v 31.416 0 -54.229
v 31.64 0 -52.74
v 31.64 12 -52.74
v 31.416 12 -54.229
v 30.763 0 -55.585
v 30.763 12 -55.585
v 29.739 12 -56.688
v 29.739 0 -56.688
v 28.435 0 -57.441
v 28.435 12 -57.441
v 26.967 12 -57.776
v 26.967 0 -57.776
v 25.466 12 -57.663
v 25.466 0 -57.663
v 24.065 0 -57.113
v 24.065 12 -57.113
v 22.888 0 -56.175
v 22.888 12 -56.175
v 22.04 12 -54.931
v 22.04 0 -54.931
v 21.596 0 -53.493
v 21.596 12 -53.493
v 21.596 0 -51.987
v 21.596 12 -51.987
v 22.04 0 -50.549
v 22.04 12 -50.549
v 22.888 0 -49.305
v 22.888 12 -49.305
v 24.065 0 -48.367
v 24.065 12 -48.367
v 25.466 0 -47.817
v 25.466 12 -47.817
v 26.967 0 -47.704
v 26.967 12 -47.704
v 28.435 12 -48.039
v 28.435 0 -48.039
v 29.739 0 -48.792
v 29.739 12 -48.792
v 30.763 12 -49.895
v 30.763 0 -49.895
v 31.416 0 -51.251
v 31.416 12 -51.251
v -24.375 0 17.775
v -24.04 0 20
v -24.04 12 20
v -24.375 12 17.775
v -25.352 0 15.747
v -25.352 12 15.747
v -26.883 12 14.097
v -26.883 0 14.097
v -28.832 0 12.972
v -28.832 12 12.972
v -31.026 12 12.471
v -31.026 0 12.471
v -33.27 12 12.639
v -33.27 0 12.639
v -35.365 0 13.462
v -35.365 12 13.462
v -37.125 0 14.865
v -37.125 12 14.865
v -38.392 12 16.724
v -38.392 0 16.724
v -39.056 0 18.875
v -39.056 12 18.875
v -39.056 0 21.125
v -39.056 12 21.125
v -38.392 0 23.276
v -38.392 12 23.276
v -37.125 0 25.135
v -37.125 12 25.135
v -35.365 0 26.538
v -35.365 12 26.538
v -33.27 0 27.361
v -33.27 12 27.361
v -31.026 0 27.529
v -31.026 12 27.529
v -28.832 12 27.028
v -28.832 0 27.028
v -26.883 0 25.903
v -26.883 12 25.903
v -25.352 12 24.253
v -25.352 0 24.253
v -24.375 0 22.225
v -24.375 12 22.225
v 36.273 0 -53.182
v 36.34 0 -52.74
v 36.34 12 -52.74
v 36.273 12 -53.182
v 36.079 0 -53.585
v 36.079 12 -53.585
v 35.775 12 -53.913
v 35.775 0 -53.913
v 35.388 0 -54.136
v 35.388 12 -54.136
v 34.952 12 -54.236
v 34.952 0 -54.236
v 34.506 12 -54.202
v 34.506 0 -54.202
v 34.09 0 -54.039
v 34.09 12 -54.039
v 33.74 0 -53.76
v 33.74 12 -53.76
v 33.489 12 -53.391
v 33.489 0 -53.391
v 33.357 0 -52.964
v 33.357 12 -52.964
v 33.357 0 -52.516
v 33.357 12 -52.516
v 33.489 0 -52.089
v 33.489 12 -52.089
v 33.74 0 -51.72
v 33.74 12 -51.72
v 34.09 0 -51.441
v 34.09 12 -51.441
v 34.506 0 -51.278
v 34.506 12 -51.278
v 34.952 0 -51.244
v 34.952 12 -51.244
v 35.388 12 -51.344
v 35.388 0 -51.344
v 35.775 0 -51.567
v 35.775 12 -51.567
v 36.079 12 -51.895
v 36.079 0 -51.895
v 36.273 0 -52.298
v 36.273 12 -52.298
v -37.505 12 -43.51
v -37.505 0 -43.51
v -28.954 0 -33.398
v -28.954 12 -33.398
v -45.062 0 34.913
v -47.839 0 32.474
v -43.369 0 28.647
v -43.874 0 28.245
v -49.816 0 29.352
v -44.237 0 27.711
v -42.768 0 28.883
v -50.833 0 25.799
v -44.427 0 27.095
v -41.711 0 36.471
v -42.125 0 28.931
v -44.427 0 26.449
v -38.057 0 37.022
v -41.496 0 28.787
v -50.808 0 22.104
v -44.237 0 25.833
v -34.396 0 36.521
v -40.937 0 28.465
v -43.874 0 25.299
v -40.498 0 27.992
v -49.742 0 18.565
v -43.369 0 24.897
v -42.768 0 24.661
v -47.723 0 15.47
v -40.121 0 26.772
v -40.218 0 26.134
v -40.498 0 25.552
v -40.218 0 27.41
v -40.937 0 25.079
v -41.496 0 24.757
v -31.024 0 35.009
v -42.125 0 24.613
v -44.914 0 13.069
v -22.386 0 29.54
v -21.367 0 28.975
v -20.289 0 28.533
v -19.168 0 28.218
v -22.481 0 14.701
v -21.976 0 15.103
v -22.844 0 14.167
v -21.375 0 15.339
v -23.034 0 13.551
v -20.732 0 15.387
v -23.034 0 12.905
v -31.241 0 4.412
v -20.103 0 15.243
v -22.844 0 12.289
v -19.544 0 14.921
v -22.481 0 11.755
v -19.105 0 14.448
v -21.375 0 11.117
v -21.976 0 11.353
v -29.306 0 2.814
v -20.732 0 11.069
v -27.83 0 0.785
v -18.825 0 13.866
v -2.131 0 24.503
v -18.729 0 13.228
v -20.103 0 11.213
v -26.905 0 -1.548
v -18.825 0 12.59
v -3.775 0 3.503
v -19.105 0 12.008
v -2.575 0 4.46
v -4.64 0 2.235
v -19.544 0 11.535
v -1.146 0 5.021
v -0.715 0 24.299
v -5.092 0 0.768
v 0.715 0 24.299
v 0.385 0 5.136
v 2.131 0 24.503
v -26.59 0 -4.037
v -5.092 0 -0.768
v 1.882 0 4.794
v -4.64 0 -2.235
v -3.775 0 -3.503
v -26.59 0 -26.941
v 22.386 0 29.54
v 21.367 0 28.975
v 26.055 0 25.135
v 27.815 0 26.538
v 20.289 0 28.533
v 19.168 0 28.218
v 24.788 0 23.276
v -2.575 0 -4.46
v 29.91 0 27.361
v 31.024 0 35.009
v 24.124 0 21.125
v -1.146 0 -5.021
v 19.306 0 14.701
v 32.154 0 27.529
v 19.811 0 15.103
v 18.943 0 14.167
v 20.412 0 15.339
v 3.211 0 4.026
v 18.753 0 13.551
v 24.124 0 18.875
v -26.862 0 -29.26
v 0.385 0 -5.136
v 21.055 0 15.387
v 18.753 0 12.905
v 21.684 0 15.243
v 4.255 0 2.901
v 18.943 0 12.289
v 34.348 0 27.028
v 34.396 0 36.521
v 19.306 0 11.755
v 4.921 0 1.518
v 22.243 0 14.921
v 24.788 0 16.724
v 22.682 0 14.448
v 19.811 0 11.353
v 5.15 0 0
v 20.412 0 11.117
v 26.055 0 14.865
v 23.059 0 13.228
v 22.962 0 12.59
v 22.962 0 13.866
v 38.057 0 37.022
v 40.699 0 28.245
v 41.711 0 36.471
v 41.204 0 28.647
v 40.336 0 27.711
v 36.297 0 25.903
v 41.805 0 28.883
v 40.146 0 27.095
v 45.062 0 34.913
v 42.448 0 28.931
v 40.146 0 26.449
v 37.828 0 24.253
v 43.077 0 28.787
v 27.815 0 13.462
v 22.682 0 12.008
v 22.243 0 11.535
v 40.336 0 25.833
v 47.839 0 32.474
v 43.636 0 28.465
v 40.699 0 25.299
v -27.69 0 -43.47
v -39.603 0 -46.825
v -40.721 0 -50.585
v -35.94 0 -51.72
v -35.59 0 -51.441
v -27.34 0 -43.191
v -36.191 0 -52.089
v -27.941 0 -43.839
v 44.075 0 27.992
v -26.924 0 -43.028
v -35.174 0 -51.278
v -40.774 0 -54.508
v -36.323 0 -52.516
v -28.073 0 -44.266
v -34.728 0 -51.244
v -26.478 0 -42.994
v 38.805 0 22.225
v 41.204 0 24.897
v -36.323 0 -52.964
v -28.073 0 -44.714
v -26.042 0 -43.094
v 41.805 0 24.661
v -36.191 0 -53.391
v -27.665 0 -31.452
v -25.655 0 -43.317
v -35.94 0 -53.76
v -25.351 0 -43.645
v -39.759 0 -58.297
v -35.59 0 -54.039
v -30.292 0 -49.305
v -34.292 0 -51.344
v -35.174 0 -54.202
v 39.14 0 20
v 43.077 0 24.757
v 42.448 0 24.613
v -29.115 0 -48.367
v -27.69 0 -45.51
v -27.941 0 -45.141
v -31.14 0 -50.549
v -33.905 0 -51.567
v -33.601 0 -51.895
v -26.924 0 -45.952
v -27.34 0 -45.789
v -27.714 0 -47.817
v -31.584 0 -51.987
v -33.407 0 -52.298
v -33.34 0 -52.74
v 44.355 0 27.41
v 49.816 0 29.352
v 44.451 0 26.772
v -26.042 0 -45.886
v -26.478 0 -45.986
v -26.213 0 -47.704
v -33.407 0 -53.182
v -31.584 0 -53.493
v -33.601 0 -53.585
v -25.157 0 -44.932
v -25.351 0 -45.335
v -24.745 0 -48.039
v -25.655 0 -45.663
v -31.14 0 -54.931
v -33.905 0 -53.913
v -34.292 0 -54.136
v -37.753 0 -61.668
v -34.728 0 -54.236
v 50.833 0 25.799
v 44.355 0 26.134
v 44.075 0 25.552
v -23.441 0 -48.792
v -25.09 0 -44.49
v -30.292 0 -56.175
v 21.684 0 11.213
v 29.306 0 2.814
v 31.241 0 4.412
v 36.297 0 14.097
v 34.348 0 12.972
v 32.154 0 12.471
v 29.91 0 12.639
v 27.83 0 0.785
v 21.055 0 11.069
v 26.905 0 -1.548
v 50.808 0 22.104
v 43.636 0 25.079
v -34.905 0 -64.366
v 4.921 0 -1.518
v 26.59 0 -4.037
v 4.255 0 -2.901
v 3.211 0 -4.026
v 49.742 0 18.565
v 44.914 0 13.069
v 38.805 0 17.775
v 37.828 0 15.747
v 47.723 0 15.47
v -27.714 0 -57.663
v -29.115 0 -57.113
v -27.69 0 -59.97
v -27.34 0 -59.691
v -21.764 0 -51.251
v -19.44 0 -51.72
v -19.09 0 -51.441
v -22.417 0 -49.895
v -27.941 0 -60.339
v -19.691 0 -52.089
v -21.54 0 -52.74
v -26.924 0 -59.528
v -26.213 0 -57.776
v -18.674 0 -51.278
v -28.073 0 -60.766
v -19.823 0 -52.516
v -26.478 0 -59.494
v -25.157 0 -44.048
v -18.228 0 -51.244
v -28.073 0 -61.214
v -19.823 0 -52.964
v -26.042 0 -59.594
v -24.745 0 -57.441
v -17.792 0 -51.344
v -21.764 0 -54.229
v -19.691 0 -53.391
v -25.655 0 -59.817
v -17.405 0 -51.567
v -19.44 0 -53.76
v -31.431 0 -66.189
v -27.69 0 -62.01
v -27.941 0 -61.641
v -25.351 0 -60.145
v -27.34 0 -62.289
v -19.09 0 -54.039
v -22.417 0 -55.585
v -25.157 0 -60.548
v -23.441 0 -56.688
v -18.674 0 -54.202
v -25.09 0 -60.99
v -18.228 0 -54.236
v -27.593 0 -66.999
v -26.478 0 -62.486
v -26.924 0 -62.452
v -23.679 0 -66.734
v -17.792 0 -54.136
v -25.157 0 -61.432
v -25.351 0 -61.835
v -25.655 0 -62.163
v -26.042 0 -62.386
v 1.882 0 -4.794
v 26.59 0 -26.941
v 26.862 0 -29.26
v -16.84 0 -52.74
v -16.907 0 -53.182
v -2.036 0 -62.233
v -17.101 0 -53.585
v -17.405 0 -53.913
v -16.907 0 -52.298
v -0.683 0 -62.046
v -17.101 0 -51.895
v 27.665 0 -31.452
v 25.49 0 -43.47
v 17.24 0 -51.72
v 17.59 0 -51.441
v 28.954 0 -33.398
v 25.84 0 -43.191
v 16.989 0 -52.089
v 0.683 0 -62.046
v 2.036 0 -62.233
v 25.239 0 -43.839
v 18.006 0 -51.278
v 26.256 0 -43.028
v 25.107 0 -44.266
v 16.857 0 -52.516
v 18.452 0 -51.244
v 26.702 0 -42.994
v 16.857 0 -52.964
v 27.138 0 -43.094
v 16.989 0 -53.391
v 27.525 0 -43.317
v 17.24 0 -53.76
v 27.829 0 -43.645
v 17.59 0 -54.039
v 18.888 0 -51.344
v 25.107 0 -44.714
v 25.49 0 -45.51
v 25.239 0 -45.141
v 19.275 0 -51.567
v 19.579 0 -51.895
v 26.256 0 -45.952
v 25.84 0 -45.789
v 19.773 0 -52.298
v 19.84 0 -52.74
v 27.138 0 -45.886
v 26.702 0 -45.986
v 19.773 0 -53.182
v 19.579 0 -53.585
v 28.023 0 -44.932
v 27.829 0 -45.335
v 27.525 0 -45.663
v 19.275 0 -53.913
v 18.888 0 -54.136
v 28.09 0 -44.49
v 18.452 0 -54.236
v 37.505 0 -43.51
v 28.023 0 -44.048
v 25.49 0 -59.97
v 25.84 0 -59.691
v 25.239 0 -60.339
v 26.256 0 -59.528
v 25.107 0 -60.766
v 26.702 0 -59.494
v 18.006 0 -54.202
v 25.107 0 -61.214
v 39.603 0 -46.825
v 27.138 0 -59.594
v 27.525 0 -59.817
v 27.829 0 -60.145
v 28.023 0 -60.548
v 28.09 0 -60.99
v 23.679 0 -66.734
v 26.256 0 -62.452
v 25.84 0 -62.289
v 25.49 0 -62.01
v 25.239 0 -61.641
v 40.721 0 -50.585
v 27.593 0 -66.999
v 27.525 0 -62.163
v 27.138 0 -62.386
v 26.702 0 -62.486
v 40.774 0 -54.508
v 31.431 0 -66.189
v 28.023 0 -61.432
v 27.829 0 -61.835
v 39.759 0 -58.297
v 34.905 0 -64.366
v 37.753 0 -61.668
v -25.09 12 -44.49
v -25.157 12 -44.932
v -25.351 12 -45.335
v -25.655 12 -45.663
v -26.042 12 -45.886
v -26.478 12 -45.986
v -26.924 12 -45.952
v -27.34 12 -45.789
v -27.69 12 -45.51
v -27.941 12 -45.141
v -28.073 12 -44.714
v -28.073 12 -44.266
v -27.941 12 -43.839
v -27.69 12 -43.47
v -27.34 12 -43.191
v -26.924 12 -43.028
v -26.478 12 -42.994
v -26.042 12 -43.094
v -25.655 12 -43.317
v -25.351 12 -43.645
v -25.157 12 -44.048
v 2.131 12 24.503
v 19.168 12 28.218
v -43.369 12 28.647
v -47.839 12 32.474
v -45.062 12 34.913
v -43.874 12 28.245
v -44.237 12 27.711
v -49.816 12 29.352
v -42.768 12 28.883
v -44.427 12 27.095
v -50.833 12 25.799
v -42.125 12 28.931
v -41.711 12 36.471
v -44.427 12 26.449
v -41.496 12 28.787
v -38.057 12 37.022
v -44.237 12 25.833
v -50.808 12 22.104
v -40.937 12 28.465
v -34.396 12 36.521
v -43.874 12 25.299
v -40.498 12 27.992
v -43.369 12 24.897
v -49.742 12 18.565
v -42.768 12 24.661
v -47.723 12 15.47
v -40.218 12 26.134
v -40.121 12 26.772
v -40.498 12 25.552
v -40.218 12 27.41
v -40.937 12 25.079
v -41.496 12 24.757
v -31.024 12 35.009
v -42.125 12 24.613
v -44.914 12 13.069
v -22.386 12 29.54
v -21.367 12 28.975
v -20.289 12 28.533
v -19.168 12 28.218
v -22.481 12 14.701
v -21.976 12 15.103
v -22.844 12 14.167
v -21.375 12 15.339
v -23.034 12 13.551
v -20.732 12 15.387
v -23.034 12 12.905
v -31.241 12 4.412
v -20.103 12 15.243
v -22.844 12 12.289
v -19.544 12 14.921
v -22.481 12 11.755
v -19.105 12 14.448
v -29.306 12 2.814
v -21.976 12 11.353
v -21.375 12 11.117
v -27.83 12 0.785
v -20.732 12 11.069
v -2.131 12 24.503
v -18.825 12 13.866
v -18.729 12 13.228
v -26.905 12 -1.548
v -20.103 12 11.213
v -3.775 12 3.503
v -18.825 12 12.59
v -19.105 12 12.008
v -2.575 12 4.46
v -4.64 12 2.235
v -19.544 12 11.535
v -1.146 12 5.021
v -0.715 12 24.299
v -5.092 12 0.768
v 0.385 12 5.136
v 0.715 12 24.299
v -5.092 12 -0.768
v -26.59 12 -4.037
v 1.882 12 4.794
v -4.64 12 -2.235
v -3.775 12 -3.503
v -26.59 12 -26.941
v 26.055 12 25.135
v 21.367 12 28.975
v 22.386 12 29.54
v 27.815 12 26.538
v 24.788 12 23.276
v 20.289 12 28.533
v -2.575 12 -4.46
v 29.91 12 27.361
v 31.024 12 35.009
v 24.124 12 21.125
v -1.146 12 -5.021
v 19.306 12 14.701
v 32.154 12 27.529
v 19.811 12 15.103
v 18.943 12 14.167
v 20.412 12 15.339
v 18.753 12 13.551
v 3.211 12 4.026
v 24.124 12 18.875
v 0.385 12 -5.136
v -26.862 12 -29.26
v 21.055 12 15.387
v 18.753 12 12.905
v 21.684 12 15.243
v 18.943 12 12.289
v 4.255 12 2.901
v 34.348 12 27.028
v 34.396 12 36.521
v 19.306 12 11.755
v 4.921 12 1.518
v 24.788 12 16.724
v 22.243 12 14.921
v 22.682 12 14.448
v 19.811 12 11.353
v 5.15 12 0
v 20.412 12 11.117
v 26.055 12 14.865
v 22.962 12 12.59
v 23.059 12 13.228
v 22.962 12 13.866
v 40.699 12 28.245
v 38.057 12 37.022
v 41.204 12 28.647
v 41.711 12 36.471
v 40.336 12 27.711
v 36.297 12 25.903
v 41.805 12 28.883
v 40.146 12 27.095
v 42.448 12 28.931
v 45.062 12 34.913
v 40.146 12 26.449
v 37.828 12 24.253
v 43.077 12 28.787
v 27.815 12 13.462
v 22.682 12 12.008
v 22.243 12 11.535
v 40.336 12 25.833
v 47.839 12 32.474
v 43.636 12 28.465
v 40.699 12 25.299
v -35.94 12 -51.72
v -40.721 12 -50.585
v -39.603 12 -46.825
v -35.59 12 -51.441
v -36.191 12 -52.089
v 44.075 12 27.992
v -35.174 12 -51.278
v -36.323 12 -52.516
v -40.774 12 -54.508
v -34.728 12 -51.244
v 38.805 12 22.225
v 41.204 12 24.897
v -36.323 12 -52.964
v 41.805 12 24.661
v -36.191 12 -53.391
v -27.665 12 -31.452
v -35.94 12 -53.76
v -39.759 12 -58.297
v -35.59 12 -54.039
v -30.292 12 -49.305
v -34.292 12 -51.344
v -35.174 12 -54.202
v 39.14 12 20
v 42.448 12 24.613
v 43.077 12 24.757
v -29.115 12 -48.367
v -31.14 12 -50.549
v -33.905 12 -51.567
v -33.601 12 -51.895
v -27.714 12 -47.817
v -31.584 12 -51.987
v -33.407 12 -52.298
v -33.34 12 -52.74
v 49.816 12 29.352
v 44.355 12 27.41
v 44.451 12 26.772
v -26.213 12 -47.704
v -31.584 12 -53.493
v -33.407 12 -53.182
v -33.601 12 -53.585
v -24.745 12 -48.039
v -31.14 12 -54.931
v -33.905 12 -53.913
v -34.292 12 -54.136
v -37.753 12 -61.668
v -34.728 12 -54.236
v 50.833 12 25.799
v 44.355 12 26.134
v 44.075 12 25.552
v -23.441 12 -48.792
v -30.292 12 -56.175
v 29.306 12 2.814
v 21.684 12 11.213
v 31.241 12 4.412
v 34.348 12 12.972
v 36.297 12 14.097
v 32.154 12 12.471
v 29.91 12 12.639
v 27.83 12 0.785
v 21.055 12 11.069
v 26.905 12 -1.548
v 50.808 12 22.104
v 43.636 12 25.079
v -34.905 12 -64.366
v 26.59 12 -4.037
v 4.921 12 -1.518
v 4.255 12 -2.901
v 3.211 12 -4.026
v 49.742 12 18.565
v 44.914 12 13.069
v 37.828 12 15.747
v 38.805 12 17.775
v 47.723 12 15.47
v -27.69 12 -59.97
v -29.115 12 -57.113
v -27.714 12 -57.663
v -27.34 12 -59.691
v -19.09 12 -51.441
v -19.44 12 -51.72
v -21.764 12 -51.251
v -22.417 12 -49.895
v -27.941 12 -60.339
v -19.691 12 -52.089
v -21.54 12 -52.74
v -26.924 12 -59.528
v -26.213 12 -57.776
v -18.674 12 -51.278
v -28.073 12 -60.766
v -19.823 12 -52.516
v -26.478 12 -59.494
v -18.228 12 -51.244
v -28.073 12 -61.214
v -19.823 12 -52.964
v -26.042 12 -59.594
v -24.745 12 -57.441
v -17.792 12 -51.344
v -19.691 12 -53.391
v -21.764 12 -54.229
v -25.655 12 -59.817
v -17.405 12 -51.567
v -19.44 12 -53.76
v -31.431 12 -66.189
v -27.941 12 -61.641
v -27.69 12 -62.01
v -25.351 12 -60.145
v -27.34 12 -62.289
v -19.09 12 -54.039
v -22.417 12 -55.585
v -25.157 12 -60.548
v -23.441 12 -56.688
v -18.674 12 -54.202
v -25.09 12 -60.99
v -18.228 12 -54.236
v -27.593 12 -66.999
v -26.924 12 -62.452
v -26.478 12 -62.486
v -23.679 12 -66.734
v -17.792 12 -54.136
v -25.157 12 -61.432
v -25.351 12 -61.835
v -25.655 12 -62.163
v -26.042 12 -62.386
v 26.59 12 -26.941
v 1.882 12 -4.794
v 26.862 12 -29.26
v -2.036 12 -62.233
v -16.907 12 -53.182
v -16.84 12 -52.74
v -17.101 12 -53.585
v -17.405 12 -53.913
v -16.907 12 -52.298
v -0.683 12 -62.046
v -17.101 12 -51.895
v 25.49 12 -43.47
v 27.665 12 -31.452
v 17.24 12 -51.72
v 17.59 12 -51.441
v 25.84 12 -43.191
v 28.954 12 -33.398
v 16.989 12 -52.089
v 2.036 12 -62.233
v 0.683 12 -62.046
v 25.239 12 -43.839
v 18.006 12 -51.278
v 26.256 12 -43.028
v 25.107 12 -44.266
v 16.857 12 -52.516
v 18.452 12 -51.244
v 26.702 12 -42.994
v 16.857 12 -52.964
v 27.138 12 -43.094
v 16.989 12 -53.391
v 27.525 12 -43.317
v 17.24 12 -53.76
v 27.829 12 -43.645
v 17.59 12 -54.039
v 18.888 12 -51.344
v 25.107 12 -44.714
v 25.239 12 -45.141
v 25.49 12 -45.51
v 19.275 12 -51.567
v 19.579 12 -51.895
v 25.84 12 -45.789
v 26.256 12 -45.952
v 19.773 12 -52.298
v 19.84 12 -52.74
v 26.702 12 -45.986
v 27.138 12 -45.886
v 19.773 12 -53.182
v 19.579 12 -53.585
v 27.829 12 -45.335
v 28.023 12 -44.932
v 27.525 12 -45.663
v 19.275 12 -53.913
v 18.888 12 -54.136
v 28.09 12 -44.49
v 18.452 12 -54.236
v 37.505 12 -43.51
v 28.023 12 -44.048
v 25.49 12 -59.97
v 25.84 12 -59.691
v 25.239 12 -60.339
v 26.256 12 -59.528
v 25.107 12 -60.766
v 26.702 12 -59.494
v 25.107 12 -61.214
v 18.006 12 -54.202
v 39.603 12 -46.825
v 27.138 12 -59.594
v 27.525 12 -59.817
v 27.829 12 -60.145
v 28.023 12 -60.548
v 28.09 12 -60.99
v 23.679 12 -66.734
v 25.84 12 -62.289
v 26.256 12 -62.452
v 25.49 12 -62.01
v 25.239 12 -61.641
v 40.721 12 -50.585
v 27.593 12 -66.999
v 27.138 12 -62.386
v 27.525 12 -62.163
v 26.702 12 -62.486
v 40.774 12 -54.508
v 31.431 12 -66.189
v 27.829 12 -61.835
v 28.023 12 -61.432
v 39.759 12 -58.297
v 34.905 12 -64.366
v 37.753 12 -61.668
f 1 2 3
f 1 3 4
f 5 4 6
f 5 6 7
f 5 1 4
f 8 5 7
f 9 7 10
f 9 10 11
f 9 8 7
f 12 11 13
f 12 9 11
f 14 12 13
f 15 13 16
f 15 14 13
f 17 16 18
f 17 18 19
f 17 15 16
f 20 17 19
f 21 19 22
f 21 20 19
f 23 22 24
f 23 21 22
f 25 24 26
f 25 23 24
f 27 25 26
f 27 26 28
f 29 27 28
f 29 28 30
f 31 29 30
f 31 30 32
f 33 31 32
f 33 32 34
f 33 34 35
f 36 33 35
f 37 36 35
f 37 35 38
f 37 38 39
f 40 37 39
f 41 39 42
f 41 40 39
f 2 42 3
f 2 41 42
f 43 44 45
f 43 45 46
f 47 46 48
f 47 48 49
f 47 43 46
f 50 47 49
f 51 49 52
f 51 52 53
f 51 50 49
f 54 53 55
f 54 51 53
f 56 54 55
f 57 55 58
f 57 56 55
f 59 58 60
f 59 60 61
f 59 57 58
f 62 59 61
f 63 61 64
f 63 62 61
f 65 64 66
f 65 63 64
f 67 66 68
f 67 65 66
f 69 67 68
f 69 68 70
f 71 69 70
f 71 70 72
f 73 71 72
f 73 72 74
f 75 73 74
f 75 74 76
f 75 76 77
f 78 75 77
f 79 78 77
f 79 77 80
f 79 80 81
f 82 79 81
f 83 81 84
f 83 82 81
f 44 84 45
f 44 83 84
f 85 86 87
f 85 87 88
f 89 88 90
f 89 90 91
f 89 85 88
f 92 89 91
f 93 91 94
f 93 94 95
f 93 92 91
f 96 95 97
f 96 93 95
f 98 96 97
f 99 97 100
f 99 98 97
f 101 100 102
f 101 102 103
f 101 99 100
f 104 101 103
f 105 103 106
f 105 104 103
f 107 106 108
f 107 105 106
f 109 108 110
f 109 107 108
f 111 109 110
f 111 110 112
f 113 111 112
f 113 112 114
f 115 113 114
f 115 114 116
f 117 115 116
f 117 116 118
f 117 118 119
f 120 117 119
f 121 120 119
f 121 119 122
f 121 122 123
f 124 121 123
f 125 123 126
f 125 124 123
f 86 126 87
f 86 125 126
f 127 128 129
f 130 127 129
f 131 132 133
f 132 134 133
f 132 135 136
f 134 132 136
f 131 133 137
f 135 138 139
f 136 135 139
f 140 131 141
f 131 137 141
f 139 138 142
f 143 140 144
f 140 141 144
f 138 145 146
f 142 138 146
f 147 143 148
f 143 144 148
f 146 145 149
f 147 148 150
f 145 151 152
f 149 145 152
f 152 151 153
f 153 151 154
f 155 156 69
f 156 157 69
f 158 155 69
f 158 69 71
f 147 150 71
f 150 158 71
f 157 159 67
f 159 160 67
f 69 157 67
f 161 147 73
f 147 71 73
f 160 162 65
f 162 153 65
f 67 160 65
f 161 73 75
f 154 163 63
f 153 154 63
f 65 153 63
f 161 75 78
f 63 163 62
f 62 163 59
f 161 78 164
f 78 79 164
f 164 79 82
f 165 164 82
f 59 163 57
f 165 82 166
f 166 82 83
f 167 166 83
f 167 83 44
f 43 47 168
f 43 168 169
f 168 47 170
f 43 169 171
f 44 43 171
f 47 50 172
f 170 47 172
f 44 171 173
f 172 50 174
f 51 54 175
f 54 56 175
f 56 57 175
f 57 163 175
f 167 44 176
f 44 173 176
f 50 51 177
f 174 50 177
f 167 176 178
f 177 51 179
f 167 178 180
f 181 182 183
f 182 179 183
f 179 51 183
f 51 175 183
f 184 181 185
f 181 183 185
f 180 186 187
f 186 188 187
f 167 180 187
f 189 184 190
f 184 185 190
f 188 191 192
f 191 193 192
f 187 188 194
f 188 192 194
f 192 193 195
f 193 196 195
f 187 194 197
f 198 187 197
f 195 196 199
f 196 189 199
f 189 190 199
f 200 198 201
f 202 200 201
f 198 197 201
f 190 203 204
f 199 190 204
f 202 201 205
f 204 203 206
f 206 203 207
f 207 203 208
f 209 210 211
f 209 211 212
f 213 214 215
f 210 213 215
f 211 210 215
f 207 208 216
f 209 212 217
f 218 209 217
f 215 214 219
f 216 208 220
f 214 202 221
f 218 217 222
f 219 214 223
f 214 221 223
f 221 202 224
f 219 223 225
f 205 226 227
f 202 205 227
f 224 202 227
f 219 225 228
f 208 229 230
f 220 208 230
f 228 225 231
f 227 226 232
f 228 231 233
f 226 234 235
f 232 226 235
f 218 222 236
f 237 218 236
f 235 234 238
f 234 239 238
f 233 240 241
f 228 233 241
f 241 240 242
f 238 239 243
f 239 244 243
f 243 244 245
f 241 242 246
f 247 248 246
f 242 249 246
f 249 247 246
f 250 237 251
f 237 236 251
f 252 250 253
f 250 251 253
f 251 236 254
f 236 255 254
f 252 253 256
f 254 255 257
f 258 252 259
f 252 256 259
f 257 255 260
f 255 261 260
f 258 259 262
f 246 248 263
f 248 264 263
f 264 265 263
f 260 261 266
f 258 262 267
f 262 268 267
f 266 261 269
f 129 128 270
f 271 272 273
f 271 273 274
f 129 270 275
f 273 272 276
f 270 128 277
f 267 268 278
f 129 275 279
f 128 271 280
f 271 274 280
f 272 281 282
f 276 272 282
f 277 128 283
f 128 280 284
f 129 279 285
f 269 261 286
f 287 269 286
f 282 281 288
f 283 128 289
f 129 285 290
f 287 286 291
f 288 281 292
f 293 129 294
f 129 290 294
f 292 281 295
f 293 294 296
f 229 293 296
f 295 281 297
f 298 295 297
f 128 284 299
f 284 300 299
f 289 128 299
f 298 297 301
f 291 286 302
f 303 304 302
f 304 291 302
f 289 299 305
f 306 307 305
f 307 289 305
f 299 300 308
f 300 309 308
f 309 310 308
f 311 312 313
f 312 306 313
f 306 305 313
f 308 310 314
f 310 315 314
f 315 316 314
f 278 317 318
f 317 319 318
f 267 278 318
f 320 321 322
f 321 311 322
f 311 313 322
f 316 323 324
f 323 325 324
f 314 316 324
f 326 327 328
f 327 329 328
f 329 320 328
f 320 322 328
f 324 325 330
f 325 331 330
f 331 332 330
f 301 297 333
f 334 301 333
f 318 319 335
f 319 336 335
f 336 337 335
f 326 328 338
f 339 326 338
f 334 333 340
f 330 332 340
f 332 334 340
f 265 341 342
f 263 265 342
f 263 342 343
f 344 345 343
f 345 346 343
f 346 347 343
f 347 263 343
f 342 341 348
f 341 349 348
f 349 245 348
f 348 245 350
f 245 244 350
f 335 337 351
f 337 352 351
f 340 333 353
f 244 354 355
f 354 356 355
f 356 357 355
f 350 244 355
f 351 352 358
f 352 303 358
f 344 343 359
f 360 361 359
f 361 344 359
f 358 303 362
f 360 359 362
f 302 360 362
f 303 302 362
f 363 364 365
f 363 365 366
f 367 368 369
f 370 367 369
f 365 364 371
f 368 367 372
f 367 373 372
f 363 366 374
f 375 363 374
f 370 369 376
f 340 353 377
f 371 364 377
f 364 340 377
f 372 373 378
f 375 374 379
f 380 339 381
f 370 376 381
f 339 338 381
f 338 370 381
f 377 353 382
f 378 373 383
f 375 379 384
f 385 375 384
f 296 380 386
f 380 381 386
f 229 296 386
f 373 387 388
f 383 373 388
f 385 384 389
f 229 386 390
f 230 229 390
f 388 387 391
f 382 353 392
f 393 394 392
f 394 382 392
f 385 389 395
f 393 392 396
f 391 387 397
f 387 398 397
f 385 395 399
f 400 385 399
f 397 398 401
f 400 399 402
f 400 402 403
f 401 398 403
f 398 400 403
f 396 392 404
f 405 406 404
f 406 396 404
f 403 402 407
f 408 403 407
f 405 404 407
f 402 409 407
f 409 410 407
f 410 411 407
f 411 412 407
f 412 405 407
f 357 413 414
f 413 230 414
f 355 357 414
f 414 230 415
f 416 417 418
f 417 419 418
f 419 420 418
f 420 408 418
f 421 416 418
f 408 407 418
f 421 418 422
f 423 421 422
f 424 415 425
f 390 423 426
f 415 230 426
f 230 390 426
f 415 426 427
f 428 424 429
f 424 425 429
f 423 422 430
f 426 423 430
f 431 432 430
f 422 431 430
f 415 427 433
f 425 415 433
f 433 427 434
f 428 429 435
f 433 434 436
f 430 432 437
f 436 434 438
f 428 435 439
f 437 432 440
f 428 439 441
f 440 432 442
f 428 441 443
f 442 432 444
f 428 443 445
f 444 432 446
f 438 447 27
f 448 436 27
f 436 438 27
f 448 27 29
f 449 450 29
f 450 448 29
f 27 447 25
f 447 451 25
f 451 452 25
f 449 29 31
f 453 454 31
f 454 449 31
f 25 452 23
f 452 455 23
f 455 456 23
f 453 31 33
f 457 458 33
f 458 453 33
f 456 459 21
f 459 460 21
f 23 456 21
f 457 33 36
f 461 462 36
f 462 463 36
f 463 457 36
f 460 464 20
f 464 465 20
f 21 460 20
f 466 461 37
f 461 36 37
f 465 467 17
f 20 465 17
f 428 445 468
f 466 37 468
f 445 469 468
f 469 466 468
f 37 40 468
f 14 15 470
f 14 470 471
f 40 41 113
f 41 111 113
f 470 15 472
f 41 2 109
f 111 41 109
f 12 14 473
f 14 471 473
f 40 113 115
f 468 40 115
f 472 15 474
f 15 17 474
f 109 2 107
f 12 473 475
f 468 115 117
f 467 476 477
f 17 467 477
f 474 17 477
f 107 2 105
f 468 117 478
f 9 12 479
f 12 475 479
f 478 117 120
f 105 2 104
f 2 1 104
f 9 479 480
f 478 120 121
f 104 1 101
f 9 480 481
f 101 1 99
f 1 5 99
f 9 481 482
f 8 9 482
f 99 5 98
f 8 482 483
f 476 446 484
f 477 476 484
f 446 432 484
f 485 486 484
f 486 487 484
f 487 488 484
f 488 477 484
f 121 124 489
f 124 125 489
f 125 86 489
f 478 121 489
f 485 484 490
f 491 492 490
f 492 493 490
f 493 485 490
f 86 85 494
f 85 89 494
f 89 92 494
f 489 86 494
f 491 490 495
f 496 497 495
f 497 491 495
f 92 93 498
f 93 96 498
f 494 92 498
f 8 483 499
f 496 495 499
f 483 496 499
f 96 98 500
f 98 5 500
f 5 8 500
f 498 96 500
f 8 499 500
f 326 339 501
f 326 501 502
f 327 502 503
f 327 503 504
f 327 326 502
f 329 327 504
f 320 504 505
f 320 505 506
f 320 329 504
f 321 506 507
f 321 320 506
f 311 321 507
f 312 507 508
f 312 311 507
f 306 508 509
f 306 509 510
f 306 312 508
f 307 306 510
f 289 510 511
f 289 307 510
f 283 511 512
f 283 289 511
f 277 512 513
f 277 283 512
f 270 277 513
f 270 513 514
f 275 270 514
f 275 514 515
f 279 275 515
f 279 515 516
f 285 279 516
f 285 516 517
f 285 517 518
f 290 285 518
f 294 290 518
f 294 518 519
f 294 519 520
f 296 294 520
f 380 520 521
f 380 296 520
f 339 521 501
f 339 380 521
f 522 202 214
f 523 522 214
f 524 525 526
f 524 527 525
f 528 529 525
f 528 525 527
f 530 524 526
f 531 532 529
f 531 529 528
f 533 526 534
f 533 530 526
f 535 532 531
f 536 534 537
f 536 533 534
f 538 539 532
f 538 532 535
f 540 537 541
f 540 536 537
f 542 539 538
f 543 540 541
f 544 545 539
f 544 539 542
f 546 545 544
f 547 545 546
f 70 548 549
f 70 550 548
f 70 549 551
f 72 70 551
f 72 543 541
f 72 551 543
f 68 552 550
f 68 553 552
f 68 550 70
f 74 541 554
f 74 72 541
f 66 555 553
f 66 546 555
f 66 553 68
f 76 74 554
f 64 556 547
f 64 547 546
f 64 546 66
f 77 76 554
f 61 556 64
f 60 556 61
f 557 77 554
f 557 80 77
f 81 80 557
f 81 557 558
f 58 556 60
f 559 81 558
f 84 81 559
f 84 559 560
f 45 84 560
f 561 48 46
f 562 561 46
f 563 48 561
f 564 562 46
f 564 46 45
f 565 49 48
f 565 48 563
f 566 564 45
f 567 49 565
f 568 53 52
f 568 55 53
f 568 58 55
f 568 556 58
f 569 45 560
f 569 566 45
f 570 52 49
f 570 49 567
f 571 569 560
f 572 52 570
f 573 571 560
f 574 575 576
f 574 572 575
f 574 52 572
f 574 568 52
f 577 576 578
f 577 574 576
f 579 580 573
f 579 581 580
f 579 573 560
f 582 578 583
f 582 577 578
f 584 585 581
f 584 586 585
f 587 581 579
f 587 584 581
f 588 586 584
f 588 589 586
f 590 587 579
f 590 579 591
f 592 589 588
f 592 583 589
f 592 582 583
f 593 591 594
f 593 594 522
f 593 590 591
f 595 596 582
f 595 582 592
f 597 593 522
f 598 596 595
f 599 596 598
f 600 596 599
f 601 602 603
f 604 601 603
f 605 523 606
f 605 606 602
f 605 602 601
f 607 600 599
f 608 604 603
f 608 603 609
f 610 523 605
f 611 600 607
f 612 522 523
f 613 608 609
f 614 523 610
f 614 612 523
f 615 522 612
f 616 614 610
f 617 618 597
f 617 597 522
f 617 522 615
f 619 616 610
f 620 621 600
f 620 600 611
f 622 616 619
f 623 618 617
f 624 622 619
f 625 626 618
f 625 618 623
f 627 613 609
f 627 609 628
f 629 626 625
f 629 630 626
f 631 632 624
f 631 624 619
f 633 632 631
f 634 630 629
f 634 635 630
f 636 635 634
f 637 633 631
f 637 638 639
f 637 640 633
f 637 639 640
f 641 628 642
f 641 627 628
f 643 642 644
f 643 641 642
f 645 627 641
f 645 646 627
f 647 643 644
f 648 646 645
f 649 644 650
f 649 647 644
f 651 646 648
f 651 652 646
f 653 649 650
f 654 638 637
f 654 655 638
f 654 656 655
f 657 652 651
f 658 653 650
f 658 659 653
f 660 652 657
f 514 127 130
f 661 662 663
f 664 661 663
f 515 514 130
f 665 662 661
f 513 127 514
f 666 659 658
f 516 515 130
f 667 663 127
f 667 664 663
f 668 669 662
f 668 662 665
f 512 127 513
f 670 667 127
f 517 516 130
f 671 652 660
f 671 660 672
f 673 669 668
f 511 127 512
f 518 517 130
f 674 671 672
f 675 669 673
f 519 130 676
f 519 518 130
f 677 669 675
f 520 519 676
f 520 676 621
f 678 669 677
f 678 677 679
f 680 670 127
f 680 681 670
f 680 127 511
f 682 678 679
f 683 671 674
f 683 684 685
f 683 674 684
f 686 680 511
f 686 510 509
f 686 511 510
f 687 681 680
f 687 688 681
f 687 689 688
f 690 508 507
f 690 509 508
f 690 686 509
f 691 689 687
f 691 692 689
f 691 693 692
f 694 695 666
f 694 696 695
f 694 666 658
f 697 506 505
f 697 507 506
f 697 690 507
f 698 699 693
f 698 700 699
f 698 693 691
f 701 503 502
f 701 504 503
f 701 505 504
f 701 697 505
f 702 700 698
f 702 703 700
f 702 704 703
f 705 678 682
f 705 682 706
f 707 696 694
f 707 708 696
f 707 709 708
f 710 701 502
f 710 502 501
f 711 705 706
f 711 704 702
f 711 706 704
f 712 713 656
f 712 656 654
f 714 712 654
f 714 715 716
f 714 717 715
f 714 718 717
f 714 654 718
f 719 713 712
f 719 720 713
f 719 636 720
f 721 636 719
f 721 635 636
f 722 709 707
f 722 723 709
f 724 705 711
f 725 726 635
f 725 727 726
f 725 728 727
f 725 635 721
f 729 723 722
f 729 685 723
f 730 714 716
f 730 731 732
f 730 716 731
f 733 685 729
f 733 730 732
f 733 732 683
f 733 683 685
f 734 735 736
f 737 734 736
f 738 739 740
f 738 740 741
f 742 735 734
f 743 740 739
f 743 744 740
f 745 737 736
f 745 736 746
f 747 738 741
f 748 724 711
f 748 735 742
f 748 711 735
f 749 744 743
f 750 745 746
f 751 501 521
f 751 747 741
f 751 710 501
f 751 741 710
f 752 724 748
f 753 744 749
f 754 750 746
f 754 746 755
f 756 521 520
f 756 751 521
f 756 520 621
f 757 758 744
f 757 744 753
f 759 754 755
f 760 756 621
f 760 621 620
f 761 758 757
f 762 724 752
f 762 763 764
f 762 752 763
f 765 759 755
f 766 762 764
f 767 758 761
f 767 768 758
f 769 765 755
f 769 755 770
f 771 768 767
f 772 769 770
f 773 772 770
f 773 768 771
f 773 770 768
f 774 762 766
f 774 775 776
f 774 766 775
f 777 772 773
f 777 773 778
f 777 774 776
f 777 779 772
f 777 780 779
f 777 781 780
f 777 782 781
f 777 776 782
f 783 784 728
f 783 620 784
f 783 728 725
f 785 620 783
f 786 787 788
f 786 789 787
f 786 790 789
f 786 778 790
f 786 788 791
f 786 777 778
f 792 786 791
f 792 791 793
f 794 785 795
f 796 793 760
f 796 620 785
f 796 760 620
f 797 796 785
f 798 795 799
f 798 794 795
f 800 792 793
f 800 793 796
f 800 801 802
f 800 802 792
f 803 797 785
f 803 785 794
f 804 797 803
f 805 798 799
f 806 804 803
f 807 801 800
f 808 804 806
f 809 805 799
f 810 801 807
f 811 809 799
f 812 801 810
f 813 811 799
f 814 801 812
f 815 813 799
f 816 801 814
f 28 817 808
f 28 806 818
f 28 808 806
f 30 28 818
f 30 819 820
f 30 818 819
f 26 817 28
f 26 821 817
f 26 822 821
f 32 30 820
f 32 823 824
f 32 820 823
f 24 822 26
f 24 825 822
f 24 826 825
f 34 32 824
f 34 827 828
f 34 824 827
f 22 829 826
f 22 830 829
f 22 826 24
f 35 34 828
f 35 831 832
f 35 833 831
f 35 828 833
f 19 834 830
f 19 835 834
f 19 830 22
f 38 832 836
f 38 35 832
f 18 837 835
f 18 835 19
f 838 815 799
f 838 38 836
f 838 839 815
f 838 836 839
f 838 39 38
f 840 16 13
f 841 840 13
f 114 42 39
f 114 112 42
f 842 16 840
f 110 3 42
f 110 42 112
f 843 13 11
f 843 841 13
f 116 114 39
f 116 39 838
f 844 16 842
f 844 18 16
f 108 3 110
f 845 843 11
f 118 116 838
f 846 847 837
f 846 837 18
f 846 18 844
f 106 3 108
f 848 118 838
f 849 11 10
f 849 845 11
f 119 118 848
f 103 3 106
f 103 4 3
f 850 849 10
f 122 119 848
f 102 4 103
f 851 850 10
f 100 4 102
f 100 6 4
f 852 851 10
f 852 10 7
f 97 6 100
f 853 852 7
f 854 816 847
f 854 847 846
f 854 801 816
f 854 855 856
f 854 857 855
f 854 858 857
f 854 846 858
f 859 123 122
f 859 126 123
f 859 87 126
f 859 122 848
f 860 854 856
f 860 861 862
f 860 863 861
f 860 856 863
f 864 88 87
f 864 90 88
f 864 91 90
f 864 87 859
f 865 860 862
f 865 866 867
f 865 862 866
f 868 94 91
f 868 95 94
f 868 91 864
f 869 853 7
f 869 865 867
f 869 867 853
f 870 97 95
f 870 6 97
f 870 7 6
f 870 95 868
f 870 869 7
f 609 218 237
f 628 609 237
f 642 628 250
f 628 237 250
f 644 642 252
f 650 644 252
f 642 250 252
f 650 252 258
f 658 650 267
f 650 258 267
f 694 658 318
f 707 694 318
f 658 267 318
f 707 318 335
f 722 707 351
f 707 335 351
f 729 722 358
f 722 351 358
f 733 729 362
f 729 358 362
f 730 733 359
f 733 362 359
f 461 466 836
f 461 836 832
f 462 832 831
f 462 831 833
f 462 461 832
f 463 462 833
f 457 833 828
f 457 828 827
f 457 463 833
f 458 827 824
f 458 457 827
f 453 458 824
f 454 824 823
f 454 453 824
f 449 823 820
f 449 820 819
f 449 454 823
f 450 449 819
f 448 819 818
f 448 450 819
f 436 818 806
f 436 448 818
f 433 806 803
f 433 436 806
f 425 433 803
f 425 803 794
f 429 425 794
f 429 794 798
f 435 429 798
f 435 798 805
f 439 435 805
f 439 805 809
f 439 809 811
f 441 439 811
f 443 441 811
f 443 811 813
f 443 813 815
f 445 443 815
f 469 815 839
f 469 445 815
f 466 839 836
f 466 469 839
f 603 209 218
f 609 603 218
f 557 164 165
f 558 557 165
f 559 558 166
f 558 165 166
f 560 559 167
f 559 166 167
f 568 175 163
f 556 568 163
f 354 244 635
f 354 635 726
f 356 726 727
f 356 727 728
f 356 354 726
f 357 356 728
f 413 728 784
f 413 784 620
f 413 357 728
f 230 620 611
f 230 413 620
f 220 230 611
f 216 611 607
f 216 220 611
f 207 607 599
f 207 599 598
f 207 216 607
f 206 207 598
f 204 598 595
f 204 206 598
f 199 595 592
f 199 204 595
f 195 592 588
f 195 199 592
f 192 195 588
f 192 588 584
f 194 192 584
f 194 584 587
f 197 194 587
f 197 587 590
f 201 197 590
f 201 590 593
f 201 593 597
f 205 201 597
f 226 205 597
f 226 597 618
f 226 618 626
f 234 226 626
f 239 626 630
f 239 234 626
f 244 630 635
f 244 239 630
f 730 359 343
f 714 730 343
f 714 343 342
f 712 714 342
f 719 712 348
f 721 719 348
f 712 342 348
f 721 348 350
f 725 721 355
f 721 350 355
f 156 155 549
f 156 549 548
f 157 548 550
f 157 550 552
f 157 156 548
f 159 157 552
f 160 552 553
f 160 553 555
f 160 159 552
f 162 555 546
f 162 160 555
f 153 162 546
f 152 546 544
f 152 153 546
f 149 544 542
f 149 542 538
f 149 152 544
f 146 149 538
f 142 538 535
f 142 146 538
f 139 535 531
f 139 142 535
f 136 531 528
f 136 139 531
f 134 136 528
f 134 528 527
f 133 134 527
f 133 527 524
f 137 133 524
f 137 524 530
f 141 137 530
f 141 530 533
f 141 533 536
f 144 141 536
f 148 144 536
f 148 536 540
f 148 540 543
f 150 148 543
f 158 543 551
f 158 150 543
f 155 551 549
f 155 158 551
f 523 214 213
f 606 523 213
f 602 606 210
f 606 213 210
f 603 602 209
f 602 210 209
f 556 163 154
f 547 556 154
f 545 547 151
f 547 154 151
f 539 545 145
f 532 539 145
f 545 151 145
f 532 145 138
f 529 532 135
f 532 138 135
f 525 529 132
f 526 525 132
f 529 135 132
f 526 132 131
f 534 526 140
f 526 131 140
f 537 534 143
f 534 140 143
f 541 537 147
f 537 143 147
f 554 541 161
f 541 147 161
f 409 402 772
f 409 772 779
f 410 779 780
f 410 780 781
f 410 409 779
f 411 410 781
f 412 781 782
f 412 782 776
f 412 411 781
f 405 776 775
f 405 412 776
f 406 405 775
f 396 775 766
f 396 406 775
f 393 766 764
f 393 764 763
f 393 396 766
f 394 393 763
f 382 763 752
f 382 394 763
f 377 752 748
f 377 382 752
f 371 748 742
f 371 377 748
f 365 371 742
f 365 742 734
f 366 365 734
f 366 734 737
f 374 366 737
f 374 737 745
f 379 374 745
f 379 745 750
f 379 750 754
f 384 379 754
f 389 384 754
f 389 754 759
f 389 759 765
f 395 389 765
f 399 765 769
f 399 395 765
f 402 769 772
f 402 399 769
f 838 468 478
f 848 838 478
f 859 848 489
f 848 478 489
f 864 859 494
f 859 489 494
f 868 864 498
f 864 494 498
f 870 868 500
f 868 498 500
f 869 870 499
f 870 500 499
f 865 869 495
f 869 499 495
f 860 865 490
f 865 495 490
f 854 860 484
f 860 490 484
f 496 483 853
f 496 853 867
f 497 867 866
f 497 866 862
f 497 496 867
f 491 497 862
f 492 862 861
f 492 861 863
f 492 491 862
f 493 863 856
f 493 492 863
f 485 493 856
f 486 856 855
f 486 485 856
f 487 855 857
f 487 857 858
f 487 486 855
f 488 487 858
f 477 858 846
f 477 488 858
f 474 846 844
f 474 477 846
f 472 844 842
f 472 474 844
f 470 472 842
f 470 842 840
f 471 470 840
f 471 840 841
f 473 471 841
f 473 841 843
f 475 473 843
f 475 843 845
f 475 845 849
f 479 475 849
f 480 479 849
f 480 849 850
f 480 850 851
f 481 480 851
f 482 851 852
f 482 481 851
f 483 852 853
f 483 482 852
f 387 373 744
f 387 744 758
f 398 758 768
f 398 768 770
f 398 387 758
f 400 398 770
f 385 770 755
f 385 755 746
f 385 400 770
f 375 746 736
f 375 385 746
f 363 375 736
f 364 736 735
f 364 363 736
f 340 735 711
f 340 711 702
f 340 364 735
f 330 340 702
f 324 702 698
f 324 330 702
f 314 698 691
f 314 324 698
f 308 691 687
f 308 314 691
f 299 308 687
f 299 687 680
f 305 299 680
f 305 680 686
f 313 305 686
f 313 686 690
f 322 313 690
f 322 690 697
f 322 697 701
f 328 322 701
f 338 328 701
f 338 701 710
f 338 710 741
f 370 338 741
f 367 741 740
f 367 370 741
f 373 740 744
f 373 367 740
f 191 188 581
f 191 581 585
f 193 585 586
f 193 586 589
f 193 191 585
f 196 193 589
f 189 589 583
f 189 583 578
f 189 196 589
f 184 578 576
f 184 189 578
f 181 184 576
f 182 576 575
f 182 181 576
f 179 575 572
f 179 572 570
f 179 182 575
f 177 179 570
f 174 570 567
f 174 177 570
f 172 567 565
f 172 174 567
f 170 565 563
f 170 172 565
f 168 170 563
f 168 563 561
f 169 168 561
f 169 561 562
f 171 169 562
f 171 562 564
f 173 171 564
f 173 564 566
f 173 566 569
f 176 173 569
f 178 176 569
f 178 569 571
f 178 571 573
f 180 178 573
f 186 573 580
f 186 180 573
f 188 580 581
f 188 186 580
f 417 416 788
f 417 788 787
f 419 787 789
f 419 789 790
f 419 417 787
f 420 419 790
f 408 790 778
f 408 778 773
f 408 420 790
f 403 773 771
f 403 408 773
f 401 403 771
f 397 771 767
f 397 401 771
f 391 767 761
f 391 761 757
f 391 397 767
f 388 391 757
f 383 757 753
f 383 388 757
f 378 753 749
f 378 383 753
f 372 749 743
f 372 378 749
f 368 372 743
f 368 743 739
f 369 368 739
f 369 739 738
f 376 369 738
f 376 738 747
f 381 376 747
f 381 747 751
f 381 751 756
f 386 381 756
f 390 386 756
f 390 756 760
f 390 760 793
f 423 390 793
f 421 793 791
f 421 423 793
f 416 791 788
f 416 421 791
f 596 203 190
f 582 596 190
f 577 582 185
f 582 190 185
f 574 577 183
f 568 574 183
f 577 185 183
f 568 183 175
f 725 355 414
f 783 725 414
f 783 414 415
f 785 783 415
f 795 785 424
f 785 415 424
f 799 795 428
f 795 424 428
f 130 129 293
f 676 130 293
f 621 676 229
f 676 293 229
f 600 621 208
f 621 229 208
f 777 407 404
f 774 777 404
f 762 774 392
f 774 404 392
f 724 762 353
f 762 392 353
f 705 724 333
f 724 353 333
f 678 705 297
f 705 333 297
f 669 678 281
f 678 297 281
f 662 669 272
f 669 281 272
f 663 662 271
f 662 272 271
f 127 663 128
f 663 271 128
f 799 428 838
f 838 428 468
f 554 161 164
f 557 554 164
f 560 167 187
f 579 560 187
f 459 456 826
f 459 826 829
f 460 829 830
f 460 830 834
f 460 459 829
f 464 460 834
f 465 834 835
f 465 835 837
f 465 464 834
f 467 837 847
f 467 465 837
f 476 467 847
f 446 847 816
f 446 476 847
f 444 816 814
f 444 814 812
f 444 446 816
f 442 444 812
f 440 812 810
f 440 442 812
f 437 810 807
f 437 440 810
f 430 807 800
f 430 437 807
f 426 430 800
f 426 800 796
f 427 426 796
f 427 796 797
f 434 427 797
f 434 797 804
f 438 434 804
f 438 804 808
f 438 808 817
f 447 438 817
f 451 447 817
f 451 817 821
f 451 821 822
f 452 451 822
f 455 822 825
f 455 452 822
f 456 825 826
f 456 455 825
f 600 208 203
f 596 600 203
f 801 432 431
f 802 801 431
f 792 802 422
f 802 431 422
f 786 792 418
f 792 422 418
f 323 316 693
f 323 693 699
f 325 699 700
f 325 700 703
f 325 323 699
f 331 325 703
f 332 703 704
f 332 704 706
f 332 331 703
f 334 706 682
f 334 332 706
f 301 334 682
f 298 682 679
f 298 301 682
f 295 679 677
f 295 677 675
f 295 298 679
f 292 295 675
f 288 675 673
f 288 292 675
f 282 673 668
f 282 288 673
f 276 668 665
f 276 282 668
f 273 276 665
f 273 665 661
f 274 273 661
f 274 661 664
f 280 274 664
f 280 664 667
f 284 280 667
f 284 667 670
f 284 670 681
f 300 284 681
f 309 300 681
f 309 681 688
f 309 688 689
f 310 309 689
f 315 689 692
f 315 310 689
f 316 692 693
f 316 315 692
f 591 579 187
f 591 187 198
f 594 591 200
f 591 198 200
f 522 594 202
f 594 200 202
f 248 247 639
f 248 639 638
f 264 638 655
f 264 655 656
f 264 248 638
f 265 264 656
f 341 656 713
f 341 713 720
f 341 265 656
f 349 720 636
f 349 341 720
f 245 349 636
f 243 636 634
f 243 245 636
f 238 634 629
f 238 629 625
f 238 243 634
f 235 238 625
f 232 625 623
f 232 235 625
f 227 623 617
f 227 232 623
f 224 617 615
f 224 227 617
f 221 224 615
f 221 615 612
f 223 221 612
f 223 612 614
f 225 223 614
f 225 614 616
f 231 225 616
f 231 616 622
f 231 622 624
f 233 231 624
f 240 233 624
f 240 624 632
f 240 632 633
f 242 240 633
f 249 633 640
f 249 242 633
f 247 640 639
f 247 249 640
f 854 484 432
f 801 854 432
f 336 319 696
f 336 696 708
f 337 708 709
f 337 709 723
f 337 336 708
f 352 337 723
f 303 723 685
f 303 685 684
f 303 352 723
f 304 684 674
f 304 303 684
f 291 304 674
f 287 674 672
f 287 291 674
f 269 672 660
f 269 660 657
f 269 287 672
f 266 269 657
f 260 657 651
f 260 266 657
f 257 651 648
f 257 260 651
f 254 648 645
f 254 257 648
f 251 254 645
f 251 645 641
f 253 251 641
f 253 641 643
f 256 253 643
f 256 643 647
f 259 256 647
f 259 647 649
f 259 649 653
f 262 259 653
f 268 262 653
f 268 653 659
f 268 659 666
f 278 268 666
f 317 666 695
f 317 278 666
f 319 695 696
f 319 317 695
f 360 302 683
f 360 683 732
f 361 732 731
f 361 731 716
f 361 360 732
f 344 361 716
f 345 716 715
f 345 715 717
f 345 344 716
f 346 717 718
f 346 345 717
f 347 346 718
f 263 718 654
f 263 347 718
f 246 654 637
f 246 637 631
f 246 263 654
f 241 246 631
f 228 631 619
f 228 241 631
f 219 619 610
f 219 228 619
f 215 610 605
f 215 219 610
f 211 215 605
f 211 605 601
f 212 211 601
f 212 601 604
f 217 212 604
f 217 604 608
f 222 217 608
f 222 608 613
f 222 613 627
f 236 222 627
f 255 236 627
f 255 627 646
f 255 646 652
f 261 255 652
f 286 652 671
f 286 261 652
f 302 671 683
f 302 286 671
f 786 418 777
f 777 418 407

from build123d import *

# Parameters (mm, degrees)
SKETCH1_R           = 5.15
SKETCH1_R_2         = 7.55
SKETCH1_R_3         = 5.05
SKETCH1_R_4         = 1.5
SKETCH1_R_5         = 2.165
BOSS_EXTRUDE1_DEPTH = 12


with BuildPart() as part:
    # Sketch1 → Boss-Extrude1 (new body)
    with BuildSketch(Plane(origin=(0, 0, 0), x_dir=(1, 0, 0), z_dir=(0, 1, 0))):
        with BuildLine():
            Line((-2.036490016, 62.232628927), (-23.679041405, 66.734453302))
            ThreePointArc((-23.679041405, 66.734453302), (-38.872266056, 60.051931597), (-37.504850395, 43.510458082))
            Line((-37.504850395, 43.510458082), (-28.95403297, 33.398266841))
            ThreePointArc((-28.95403297, 33.398266841), (-27.199588127, 30.379378664), (-26.59, 26.941332001))
            Line((-26.59, 26.941332001), (-26.59, 4.037047599))
            ThreePointArc((-26.59, 4.037047599), (-27.829524982, -0.785200575), (-31.240815491, -4.411989333))
            Line((-31.240815491, -4.411989333), (-44.914180747, -13.06875746))
            ThreePointArc((-44.914180747, -13.06875746), (-48.938899729, -30.983792167), (-31.023865021, -35.008511149))
            Line((-31.023865021, -35.008511149), (-22.386088755, -29.539833551))
            ThreePointArc((-22.386088755, -29.539833551), (-20.83471499, -28.738106539), (-19.167525971, -28.21848405))
            Line((-19.167525971, -28.21848405), (-2.130621725, -24.503257579))
            ThreePointArc((-2.130621725, -24.503257579), (0, -24.273644012), (2.130621725, -24.503257579))
            Line((2.130621725, -24.503257579), (19.167525971, -28.21848405))
            ThreePointArc((19.167525971, -28.21848405), (20.83471499, -28.738106539), (22.386088755, -29.539833551))
            Line((22.386088755, -29.539833551), (31.023865021, -35.008511149))
            ThreePointArc((31.023865021, -35.008511149), (48.938899729, -30.983792167), (44.914180747, -13.06875746))
            Line((44.914180747, -13.06875746), (31.240815491, -4.411989333))
            ThreePointArc((31.240815491, -4.411989333), (27.829524982, -0.785200575), (26.59, 4.037047599))
            Line((26.59, 4.037047599), (26.59, 26.941332001))
            ThreePointArc((26.59, 26.941332001), (27.199588127, 30.379378664), (28.95403297, 33.398266841))
            Line((28.95403297, 33.398266841), (37.504850395, 43.510458082))
            ThreePointArc((37.504850395, 43.510458082), (38.872266056, 60.051931597), (23.679041405, 66.734453302))
            Line((23.679041405, 66.734453302), (2.036490016, 62.232628927))
            ThreePointArc((2.036490016, 62.232628927), (0, 62.023068571), (-2.036490016, 62.232628927))
        make_face()
        Circle(SKETCH1_R, mode=Mode.SUBTRACT)
        with Locations((-31.59, -20)):
            Circle(SKETCH1_R_2, mode=Mode.SUBTRACT)
        with Locations((-26.59, 52.74)):
            Circle(SKETCH1_R_3, mode=Mode.SUBTRACT)
        with Locations((-26.59, 60.99)):
            Circle(SKETCH1_R_4, mode=Mode.SUBTRACT)
        with Locations((-18.34, 52.74)):
            Circle(SKETCH1_R_4, mode=Mode.SUBTRACT)
        with Locations((-26.59, 44.49)):
            Circle(SKETCH1_R_4, mode=Mode.SUBTRACT)
        with Locations((-34.84, 52.74)):
            Circle(SKETCH1_R_4, mode=Mode.SUBTRACT)
        with Locations((-42.286480756, -26.772067589)):
            Circle(SKETCH1_R_5, mode=Mode.SUBTRACT)
        with Locations((-20.893519244, -13.227932411)):
            Circle(SKETCH1_R_5, mode=Mode.SUBTRACT)
        with Locations((20.893519244, -13.227932411)):
            Circle(SKETCH1_R_5, mode=Mode.SUBTRACT)
        with Locations((42.286480756, -26.772067589)):
            Circle(SKETCH1_R_5, mode=Mode.SUBTRACT)
        with Locations((34.84, 52.74)):
            Circle(SKETCH1_R_4, mode=Mode.SUBTRACT)
        with Locations((26.59, 44.49)):
            Circle(SKETCH1_R_4, mode=Mode.SUBTRACT)
        with Locations((18.34, 52.74)):
            Circle(SKETCH1_R_4, mode=Mode.SUBTRACT)
        with Locations((26.59, 60.99)):
            Circle(SKETCH1_R_4, mode=Mode.SUBTRACT)
        with Locations((26.59, 52.74)):
            Circle(SKETCH1_R_3, mode=Mode.SUBTRACT)
        with Locations((31.59, -20)):
            Circle(SKETCH1_R_2, mode=Mode.SUBTRACT)
    extrude(amount=BOSS_EXTRUDE1_DEPTH)


solid = part.part
